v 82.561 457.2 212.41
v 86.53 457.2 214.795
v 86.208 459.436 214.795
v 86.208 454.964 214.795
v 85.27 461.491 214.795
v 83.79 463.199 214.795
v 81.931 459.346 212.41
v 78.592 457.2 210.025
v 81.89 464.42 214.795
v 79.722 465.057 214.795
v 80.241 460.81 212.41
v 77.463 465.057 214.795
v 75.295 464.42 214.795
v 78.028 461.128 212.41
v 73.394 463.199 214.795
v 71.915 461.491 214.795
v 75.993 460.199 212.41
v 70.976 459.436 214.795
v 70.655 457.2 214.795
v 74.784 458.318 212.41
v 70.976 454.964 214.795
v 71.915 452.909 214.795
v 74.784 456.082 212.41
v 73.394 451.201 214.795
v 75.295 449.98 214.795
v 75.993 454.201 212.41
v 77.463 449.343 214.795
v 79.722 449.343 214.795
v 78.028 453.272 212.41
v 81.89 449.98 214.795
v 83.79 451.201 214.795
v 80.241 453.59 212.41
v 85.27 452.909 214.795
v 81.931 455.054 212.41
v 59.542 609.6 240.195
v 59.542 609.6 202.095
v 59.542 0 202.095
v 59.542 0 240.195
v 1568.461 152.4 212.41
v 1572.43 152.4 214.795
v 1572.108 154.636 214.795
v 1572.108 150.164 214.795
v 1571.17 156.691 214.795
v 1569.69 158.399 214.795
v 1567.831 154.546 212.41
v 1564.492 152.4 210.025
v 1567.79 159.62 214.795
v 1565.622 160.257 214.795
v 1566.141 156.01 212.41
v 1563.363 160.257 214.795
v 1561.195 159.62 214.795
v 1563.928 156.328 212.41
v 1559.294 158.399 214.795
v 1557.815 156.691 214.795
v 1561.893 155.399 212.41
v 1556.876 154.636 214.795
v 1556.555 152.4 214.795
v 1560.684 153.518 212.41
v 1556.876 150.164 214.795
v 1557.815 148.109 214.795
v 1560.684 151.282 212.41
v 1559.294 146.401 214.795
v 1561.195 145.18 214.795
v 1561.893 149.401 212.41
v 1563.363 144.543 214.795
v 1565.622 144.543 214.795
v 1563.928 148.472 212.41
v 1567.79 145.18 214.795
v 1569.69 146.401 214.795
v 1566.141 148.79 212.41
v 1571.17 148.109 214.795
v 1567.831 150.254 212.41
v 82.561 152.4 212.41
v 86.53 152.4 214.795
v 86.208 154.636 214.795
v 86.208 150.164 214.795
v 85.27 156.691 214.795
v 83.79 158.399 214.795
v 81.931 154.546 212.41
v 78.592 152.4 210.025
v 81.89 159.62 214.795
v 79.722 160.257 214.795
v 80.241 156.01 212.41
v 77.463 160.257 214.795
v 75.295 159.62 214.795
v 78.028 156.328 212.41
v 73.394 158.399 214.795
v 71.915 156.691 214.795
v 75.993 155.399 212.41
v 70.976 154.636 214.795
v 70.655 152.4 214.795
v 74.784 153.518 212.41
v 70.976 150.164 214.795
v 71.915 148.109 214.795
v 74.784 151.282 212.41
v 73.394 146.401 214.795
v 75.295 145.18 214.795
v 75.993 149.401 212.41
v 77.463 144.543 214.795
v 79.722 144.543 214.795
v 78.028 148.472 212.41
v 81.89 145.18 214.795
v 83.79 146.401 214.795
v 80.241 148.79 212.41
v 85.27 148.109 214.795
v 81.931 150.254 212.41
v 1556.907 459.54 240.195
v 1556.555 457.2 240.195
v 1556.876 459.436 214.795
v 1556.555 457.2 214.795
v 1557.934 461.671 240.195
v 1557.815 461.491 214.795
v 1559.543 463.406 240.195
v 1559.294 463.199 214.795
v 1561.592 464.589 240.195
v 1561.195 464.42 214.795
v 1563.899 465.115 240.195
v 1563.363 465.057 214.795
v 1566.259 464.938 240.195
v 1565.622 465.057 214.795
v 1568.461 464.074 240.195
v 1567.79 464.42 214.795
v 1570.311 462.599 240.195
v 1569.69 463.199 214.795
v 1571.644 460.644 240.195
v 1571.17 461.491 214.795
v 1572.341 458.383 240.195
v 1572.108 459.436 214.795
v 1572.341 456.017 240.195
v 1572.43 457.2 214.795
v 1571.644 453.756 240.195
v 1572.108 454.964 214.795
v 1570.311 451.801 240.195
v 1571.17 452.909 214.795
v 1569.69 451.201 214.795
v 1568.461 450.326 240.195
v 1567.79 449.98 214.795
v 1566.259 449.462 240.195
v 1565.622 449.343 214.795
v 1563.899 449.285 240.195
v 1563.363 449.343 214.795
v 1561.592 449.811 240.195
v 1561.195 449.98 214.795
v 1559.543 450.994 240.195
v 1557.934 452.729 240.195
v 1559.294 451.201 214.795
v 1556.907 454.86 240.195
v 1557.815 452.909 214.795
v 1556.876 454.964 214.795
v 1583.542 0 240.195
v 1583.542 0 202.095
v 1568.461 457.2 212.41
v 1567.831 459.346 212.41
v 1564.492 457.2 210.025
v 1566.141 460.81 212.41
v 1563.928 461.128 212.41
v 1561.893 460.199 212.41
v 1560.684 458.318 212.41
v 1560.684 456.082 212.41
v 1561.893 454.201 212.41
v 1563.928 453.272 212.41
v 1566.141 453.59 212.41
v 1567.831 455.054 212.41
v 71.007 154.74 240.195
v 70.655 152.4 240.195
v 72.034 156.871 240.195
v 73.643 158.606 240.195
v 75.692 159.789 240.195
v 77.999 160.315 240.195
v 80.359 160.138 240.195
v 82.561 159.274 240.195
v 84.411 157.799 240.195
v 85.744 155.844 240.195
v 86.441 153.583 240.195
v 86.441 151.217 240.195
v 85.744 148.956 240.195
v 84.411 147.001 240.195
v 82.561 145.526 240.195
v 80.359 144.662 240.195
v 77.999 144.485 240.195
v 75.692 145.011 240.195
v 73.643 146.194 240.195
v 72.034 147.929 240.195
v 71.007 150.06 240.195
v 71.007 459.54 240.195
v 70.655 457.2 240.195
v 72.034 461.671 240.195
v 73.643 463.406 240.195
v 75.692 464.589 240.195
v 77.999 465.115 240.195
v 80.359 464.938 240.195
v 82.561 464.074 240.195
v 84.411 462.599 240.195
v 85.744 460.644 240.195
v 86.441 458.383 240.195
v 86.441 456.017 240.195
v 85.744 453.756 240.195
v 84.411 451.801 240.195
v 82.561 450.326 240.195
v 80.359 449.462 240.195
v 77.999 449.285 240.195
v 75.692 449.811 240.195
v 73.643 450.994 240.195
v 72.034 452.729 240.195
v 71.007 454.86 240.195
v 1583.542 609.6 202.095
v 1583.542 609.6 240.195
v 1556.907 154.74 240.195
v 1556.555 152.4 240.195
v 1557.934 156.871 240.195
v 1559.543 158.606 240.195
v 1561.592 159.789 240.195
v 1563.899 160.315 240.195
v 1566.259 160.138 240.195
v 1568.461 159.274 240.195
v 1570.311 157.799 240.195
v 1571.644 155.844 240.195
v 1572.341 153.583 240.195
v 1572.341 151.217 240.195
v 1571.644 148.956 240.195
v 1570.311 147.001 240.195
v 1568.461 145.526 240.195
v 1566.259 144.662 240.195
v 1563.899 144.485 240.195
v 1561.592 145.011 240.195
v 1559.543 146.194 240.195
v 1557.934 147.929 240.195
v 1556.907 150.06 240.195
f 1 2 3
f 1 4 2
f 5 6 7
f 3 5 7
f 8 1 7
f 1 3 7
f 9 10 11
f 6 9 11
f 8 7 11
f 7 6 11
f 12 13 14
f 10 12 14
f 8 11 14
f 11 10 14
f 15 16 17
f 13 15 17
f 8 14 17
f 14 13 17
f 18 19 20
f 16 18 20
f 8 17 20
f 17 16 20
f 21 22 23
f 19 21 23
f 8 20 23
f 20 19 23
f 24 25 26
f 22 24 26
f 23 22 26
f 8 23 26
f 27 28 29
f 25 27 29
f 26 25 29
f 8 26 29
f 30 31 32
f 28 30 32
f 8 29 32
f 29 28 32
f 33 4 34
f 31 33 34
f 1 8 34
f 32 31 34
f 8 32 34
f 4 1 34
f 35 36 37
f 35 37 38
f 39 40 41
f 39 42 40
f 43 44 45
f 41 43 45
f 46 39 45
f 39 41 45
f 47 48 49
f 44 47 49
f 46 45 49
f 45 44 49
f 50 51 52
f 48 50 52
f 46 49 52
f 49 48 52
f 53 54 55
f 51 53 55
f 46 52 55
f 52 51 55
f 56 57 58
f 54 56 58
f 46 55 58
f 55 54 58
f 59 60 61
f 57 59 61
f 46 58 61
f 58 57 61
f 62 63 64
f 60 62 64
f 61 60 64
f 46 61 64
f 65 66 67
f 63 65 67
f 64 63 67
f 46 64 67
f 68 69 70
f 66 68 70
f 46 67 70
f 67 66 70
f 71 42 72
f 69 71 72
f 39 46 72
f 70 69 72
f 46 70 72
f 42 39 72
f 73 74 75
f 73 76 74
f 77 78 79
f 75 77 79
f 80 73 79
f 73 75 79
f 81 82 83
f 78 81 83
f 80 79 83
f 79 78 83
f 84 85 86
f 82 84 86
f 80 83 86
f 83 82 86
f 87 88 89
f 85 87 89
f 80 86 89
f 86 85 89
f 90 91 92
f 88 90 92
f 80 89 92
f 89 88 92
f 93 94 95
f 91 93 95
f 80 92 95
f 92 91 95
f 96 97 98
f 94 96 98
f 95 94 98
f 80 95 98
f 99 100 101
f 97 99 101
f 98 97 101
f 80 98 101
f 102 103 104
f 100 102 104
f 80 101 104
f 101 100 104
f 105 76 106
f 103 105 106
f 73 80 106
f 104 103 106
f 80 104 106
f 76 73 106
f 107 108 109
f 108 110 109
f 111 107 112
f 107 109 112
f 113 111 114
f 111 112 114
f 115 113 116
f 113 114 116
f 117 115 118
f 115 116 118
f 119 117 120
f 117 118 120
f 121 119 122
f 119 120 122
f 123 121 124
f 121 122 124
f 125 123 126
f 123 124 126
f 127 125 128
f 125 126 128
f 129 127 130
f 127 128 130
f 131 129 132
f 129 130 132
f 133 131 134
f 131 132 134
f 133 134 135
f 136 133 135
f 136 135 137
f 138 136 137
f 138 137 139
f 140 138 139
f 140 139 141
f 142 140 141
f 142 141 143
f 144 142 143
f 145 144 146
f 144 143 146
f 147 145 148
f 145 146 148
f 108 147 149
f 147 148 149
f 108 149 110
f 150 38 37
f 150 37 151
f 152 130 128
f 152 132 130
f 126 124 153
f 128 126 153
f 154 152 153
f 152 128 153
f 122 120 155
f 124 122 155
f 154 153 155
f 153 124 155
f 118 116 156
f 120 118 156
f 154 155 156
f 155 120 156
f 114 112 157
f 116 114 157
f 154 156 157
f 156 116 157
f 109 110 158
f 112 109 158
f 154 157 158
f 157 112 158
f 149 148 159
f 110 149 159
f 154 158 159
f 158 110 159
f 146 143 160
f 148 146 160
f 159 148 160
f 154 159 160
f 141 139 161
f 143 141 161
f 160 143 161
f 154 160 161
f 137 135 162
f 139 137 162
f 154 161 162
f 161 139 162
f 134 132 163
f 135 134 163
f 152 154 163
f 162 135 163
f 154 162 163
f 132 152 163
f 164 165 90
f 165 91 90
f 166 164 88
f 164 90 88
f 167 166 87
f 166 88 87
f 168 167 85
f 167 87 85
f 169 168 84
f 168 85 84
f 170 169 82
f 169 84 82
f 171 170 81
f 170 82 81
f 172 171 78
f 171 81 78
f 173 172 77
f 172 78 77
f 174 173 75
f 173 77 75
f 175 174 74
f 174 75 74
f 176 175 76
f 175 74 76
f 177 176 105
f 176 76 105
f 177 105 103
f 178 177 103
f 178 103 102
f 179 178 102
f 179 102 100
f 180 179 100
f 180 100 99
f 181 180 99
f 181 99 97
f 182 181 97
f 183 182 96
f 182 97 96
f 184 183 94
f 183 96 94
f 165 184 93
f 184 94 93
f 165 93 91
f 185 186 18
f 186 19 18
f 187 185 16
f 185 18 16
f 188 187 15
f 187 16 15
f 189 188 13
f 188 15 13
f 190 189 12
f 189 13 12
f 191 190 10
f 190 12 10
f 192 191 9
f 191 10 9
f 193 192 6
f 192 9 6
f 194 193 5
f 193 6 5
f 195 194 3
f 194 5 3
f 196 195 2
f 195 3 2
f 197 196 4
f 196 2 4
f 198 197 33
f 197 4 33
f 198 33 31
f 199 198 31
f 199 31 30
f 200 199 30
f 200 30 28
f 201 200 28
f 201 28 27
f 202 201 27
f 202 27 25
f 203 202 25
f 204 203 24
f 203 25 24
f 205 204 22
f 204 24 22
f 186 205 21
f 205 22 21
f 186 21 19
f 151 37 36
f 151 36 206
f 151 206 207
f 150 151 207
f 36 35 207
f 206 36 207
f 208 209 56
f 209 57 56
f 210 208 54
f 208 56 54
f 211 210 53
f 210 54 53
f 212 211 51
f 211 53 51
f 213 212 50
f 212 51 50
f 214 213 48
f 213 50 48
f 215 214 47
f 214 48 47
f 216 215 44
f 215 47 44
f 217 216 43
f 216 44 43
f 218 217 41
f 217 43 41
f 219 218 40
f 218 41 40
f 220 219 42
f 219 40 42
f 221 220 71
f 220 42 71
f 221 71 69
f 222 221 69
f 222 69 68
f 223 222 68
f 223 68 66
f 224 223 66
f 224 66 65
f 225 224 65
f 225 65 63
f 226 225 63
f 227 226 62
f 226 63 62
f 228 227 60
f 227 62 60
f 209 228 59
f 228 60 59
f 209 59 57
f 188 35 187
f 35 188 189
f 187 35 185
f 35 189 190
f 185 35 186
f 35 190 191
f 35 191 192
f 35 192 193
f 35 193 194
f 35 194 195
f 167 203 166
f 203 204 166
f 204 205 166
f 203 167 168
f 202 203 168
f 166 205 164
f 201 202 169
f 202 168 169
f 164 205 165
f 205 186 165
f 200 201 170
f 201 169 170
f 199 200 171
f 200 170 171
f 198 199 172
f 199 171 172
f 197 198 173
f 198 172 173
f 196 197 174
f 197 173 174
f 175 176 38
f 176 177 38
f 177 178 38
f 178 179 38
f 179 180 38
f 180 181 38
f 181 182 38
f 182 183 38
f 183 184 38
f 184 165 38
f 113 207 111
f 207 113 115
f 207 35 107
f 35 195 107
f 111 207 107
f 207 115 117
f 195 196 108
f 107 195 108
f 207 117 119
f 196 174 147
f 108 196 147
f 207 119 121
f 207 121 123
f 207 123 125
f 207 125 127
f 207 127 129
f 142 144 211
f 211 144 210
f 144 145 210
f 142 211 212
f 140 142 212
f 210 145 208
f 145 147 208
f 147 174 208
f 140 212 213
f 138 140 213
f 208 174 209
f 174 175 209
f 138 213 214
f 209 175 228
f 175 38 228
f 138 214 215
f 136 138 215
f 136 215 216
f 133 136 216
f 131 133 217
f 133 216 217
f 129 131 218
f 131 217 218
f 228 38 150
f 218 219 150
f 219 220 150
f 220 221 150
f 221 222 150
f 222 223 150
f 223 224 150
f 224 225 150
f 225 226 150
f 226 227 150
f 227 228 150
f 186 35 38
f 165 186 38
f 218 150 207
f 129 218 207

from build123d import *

# Parameters (mm, degrees)
F0_W     = 1524
F0_H     = 38.1
F1_DEPTH = 609.6
F3_D     = 15.875
F3_DEPTH = 25.4
F3_TIP   = 4.7693311635


with BuildPart() as f1:
    # F0 (on Front) → F1 (new body)
    with BuildSketch(Plane.XZ):
        with Locations((821.5423469543, 221.1446145058)):
            Rectangle(F0_W, F0_H)
    extrude(amount=-F1_DEPTH)

    # F3
    with Locations(Plane.XY.offset(240.1946145058)):
        with Locations((78.5923469543, 457.2), (78.5923469543, 152.4), (1564.4923469543, 457.2), (1564.4923469543, 152.4)):
            Hole(F3_D / 2, depth=F3_DEPTH)
            with Locations((0, 0, -(F3_DEPTH + F3_TIP / 2))):  # 118° drill point
                Cone(0, F3_D / 2, F3_TIP, mode=Mode.SUBTRACT)


solid = f1.part
